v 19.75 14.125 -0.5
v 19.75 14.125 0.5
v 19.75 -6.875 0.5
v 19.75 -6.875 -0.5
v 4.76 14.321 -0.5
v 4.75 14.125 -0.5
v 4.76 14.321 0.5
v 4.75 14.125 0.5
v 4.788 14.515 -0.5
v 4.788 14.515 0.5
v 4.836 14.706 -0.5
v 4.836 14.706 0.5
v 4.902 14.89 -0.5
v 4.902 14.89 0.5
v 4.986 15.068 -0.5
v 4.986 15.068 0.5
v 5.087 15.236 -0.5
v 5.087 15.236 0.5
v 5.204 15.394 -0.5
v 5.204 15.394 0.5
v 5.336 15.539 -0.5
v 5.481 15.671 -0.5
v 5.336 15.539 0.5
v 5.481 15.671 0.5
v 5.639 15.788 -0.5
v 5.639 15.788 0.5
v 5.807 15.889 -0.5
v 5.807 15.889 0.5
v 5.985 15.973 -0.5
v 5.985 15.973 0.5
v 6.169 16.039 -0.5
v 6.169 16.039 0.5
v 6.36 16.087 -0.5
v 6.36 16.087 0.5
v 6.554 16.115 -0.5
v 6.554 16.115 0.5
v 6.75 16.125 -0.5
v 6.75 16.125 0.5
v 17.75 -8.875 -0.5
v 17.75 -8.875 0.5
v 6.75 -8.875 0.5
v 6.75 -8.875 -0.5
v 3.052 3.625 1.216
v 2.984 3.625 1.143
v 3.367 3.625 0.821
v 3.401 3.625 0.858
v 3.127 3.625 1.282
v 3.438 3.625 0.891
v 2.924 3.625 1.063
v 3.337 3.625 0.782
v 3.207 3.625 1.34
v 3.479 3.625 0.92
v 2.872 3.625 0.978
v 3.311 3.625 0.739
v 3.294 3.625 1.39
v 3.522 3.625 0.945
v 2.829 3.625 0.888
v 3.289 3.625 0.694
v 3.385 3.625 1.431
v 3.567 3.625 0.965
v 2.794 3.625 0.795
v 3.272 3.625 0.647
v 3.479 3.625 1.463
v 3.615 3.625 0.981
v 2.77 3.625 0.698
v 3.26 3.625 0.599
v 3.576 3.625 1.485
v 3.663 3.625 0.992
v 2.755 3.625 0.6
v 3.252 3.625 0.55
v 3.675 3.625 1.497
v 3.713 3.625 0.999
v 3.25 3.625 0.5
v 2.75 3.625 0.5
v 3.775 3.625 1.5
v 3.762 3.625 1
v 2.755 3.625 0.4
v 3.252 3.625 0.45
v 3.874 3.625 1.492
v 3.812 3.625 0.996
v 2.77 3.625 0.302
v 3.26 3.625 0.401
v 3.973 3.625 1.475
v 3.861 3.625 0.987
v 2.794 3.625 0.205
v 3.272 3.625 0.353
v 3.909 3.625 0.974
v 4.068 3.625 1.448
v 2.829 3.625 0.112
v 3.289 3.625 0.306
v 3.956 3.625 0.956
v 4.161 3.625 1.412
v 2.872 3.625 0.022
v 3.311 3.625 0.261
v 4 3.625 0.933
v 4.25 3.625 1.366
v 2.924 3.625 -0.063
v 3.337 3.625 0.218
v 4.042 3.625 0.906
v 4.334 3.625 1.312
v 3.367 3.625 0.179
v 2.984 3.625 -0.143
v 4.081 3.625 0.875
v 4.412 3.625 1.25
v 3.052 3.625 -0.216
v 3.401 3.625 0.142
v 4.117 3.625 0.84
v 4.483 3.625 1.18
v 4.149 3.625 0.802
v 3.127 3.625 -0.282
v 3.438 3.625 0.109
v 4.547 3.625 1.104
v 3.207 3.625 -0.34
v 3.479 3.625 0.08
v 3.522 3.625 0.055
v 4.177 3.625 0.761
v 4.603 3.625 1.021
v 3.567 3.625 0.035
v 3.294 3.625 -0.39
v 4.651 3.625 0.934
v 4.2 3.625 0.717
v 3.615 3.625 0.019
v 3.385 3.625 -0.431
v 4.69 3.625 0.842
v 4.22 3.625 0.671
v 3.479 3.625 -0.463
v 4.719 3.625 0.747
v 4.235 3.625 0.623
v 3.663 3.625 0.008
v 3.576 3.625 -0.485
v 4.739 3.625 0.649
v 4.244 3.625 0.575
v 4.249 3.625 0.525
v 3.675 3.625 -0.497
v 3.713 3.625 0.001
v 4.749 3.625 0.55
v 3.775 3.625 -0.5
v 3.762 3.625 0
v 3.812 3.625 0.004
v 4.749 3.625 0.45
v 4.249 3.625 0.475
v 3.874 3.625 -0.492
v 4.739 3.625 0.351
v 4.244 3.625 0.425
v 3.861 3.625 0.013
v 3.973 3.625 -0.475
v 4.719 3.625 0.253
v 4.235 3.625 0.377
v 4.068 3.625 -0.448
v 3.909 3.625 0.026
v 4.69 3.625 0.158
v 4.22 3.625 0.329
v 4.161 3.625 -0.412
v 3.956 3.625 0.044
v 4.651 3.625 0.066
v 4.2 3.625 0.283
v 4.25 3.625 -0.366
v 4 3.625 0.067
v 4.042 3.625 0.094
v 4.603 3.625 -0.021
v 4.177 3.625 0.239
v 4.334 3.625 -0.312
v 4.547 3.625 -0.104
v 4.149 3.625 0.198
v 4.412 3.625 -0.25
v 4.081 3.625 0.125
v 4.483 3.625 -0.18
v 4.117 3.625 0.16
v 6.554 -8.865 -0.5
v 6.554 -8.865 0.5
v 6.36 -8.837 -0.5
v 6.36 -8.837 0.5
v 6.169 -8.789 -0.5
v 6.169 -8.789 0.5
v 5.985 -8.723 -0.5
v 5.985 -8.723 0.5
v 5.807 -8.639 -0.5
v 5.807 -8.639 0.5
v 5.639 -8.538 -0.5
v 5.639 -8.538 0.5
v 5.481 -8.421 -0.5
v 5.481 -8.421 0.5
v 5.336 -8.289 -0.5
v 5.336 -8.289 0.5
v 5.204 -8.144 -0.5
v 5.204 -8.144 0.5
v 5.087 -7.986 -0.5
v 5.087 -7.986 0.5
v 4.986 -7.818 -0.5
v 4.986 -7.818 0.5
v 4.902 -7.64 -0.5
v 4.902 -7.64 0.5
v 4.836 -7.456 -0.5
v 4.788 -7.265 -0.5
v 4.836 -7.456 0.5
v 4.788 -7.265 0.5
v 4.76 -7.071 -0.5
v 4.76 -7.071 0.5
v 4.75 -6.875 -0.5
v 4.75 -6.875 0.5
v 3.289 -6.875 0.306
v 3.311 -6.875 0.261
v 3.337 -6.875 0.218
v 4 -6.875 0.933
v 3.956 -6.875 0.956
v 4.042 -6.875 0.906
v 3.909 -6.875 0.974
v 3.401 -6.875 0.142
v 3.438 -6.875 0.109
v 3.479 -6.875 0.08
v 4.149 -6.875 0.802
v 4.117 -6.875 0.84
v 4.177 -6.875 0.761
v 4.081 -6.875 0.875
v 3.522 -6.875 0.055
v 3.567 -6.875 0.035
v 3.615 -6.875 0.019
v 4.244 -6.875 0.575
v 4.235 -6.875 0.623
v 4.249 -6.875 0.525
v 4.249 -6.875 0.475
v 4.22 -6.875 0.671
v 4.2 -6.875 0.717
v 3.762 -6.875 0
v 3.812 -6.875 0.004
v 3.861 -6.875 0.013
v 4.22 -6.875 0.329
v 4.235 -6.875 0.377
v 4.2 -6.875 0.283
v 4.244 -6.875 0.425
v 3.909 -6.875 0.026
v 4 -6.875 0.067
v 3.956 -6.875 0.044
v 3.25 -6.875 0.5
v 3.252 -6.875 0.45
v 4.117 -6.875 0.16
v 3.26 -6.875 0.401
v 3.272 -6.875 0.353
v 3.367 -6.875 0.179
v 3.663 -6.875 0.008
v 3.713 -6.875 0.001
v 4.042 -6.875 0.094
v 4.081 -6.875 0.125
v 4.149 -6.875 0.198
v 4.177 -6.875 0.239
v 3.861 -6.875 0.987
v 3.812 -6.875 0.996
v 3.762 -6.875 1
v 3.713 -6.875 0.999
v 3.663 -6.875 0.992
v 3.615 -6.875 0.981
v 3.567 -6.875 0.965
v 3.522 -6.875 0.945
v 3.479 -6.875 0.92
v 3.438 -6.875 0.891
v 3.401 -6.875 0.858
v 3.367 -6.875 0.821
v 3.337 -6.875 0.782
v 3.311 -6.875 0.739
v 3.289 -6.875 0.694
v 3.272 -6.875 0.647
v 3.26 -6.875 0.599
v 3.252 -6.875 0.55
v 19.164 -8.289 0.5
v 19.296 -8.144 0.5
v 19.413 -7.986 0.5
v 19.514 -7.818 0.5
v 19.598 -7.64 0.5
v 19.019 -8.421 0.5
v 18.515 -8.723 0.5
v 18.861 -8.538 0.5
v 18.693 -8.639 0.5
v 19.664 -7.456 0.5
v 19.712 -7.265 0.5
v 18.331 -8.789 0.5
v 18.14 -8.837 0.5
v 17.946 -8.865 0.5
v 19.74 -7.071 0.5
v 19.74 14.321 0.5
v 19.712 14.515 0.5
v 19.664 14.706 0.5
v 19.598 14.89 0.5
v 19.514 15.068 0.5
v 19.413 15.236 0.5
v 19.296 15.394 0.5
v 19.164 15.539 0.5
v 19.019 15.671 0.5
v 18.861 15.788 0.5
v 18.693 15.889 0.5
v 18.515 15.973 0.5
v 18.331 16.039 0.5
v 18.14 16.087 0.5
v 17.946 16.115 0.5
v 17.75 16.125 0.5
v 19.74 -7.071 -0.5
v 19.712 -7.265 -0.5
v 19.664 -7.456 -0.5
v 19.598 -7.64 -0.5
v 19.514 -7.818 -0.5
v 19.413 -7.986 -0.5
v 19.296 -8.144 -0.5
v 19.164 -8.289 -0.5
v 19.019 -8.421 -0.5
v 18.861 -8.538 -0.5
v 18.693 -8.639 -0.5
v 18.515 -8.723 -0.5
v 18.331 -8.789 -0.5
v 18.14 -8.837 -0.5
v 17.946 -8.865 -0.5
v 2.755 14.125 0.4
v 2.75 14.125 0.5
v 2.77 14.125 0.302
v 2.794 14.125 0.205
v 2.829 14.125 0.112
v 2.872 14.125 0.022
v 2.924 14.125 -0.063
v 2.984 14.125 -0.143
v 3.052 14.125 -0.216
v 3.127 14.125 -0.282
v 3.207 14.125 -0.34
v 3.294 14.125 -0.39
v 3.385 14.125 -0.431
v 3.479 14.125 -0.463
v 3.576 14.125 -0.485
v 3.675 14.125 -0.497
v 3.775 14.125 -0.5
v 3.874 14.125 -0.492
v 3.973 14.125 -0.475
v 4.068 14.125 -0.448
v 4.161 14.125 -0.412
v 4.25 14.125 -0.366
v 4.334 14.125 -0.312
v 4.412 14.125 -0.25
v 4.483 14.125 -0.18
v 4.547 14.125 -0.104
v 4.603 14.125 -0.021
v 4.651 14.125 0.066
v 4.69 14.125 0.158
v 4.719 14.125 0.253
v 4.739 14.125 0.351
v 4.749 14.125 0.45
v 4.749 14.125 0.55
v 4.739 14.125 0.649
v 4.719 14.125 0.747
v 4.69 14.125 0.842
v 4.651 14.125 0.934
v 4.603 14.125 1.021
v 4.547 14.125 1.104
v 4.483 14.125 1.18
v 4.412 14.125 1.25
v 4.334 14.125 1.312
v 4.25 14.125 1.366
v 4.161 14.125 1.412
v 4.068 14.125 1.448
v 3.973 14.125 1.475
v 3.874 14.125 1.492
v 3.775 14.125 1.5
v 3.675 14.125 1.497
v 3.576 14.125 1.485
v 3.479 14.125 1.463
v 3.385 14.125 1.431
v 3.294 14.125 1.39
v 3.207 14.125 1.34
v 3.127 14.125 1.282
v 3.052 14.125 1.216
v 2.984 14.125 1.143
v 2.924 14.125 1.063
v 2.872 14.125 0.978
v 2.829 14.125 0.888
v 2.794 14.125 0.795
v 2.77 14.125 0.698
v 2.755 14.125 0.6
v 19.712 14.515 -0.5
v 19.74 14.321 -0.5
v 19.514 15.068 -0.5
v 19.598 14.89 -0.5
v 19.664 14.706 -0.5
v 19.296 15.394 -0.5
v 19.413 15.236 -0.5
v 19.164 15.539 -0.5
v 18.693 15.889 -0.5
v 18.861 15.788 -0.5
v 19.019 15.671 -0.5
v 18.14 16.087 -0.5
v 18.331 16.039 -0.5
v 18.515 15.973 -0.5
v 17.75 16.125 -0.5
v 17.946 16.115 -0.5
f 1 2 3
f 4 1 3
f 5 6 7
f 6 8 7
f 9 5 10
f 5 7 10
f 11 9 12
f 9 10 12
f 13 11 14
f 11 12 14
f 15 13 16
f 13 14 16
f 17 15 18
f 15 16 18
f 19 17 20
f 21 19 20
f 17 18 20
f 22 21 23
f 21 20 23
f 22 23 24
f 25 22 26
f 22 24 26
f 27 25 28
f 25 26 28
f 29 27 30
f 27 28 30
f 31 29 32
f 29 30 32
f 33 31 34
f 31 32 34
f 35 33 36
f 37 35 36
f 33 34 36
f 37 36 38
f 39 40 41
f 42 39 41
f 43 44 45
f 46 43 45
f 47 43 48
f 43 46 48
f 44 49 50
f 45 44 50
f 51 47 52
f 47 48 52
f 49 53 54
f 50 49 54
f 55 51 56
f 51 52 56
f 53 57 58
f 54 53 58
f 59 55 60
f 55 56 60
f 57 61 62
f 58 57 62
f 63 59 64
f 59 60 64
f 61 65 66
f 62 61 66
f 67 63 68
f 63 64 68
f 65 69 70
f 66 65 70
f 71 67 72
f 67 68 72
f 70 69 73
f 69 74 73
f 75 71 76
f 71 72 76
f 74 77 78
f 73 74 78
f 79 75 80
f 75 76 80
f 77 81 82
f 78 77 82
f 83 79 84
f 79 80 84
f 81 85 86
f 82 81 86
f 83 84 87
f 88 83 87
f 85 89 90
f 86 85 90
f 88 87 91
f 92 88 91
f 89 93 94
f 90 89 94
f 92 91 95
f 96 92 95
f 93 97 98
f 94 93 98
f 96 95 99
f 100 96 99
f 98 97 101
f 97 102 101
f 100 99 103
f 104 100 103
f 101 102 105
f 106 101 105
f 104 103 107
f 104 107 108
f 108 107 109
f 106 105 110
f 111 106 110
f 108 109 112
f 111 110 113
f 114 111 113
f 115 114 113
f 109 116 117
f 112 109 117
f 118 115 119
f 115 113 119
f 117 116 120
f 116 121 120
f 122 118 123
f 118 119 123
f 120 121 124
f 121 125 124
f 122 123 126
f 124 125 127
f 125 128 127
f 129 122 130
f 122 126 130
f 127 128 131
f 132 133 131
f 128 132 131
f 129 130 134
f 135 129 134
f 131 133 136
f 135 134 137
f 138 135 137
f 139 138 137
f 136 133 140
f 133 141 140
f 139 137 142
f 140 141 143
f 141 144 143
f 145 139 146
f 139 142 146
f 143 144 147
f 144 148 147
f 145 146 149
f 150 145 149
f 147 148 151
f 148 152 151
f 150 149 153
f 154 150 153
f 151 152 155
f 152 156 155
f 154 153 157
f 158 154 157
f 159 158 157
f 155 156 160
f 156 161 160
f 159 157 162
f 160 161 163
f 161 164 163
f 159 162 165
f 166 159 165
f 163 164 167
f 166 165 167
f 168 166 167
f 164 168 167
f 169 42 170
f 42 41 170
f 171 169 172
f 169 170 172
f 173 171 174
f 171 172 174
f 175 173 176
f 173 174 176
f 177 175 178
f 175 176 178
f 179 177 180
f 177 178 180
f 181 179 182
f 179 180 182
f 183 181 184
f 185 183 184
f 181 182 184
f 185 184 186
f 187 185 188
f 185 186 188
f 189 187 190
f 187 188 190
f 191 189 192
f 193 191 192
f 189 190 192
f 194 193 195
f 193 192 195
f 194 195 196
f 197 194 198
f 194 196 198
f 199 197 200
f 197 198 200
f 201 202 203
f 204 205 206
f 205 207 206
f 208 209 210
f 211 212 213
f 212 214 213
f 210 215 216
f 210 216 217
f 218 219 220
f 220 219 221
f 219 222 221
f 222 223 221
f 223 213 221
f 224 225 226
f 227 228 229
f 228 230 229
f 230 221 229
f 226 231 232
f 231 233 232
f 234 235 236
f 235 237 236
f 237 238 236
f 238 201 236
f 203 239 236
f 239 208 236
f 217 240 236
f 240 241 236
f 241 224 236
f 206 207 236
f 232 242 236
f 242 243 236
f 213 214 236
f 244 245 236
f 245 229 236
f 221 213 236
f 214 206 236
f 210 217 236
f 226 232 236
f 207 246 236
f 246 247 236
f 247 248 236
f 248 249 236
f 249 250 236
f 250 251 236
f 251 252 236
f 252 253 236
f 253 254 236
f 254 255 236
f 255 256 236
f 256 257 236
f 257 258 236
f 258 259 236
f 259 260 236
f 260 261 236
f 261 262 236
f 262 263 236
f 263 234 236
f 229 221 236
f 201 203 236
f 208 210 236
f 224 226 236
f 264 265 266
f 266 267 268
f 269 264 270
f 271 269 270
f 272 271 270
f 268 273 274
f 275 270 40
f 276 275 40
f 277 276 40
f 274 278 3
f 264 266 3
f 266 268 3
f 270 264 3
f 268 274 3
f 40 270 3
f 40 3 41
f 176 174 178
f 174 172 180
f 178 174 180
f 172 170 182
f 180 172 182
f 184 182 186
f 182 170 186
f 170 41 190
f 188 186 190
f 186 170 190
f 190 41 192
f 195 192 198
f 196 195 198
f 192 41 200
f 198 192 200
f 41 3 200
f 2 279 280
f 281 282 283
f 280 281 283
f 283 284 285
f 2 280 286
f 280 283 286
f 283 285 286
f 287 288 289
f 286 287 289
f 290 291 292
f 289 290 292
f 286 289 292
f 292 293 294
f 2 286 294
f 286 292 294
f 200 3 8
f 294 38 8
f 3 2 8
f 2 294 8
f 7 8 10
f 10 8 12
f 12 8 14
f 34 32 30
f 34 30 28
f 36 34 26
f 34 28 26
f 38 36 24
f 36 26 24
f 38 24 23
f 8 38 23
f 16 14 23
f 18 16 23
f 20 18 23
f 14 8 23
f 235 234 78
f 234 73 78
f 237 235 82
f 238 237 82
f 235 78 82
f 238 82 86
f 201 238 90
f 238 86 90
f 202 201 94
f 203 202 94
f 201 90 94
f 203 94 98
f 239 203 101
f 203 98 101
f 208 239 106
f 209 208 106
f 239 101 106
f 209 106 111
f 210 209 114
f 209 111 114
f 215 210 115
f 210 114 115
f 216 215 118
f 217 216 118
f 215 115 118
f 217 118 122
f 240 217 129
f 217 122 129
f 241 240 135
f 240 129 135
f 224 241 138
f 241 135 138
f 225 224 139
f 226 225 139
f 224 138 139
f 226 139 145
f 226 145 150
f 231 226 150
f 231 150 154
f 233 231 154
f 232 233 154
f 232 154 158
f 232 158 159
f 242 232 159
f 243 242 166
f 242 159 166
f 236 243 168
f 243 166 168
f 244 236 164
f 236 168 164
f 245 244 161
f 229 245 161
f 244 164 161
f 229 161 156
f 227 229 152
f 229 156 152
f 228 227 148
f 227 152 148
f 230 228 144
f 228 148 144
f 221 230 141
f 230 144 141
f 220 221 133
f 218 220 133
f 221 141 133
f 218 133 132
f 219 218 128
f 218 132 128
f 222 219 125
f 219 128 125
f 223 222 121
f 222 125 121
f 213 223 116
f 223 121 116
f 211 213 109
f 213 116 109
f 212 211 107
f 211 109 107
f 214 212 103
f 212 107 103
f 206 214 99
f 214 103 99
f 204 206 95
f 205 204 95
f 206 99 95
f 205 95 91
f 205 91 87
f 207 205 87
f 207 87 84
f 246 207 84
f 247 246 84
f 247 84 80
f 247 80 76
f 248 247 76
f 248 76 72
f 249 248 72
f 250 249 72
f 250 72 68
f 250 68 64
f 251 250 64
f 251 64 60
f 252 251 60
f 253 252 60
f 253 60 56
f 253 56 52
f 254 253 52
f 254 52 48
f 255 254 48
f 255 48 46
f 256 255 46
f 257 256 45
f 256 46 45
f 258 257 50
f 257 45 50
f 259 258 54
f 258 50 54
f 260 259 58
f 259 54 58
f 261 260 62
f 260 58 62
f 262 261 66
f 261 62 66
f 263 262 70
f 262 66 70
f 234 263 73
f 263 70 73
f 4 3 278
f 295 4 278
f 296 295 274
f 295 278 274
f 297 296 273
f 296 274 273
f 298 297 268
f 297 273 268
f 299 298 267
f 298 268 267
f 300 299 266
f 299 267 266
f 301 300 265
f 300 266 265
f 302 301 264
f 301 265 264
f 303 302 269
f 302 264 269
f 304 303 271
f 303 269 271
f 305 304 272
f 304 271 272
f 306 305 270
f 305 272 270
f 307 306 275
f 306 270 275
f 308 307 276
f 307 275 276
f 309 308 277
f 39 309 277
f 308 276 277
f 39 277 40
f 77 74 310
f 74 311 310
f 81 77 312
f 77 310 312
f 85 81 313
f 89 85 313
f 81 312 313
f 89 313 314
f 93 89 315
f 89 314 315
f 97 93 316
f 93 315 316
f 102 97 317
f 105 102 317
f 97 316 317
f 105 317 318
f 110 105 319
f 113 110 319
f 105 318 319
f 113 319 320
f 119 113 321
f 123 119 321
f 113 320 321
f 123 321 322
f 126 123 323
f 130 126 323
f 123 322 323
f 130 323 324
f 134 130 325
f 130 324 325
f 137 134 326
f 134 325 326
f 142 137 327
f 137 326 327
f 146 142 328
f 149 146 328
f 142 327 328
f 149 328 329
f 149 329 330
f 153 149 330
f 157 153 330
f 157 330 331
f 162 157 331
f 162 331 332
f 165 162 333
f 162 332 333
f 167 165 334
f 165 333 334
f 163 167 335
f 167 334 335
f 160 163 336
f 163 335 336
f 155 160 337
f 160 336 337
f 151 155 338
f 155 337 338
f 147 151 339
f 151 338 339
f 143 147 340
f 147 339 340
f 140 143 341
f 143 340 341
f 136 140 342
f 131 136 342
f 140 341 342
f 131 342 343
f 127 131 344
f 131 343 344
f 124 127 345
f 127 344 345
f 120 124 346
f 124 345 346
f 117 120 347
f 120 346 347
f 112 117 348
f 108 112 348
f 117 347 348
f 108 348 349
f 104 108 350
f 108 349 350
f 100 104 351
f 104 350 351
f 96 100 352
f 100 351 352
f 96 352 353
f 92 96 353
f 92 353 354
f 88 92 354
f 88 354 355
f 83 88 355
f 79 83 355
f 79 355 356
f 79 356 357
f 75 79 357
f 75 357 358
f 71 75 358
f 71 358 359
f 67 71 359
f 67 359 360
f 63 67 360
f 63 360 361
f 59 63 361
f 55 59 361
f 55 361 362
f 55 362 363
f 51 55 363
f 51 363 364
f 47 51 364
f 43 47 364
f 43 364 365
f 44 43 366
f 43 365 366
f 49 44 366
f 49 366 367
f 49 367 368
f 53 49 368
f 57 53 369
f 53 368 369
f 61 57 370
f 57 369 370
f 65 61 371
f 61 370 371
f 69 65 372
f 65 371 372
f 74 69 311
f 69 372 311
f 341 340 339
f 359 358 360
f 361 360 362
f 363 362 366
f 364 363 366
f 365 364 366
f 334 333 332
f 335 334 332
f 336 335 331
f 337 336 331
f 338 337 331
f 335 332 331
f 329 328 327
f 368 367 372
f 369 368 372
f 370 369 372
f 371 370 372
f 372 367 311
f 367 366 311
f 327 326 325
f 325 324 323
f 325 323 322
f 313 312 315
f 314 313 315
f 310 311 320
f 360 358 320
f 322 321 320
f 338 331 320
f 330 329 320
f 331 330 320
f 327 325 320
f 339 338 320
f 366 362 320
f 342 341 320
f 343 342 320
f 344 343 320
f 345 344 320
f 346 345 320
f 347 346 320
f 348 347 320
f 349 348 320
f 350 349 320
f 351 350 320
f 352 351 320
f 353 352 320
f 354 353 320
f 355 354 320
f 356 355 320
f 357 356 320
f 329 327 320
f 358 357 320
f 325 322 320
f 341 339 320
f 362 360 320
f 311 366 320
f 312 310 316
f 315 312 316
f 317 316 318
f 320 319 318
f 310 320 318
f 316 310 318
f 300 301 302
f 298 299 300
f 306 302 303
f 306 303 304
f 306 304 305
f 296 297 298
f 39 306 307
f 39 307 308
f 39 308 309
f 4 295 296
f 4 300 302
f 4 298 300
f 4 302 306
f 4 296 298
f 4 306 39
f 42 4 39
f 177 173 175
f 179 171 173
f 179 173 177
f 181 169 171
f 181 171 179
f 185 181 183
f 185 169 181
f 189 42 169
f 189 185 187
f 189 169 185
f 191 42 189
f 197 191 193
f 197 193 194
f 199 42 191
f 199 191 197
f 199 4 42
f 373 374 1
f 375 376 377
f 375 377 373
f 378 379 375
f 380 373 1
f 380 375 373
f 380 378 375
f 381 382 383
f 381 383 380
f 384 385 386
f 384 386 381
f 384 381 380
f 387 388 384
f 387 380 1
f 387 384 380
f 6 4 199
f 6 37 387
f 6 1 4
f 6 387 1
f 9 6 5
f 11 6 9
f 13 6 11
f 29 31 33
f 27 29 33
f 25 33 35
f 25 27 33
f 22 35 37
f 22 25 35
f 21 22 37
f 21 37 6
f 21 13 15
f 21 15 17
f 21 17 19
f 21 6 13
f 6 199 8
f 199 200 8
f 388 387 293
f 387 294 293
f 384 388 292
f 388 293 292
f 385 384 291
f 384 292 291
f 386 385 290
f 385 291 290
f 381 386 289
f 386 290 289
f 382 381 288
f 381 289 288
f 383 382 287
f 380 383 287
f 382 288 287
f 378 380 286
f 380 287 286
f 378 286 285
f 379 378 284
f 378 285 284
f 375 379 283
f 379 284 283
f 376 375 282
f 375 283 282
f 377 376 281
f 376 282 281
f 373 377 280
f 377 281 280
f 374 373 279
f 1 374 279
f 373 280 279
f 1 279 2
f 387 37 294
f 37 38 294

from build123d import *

# Parameters (mm, degrees)
EXTRUDE_1_DEPTH = 0.5
SKETCH_2_W      = 0.5
SKETCH_2_H      = 10.5


with BuildPart() as part:
    # 草图1 → 凸台-拉伸1 (new, symmetric)
    with BuildSketch(Plane.XY):
        with BuildLine():
            Line((17.75, -8.875), (6.75, -8.875))
            ThreePointArc((6.75, -8.875), (5.335786438, -8.289213562), (4.75, -6.875))
            Line((4.75, -6.875), (4.75, 14.125))
            ThreePointArc((4.75, 14.125), (5.335786438, 15.539213562), (6.75, 16.125))
            Line((6.75, 16.125), (17.75, 16.125))
            ThreePointArc((17.75, 16.125), (19.164213562, 15.539213562), (19.75, 14.125))
            Line((19.75, 14.125), (19.75, -6.875))
            ThreePointArc((19.75, -6.875), (19.164213562, -8.289213562), (17.75, -8.875))
        make_face()
    extrude(amount=EXTRUDE_1_DEPTH, both=True)


with BuildPart() as body_2:
    # 草图2 → 旋转1 (revolve)
    with BuildSketch(Plane.XY.offset(0.5), mode=Mode.PRIVATE) as revolve_1_sk:
        Polygon((4.75, 14.125), (3.75, 14.125), (3.75, 3.625), (4.25, 3.625), (4.75, 3.625), align=None)
        with Locations((4, -1.625)):
            Rectangle(SKETCH_2_W, SKETCH_2_H)
    revolve(revolve_1_sk.sketch.rotate(Axis((3.75, 14.125, 0.5), (0, -1, 0)), 180), axis=Axis((3.75, 14.125, 0.5), (0, -1, 0)))


solid = Compound([part.part, body_2.part])
